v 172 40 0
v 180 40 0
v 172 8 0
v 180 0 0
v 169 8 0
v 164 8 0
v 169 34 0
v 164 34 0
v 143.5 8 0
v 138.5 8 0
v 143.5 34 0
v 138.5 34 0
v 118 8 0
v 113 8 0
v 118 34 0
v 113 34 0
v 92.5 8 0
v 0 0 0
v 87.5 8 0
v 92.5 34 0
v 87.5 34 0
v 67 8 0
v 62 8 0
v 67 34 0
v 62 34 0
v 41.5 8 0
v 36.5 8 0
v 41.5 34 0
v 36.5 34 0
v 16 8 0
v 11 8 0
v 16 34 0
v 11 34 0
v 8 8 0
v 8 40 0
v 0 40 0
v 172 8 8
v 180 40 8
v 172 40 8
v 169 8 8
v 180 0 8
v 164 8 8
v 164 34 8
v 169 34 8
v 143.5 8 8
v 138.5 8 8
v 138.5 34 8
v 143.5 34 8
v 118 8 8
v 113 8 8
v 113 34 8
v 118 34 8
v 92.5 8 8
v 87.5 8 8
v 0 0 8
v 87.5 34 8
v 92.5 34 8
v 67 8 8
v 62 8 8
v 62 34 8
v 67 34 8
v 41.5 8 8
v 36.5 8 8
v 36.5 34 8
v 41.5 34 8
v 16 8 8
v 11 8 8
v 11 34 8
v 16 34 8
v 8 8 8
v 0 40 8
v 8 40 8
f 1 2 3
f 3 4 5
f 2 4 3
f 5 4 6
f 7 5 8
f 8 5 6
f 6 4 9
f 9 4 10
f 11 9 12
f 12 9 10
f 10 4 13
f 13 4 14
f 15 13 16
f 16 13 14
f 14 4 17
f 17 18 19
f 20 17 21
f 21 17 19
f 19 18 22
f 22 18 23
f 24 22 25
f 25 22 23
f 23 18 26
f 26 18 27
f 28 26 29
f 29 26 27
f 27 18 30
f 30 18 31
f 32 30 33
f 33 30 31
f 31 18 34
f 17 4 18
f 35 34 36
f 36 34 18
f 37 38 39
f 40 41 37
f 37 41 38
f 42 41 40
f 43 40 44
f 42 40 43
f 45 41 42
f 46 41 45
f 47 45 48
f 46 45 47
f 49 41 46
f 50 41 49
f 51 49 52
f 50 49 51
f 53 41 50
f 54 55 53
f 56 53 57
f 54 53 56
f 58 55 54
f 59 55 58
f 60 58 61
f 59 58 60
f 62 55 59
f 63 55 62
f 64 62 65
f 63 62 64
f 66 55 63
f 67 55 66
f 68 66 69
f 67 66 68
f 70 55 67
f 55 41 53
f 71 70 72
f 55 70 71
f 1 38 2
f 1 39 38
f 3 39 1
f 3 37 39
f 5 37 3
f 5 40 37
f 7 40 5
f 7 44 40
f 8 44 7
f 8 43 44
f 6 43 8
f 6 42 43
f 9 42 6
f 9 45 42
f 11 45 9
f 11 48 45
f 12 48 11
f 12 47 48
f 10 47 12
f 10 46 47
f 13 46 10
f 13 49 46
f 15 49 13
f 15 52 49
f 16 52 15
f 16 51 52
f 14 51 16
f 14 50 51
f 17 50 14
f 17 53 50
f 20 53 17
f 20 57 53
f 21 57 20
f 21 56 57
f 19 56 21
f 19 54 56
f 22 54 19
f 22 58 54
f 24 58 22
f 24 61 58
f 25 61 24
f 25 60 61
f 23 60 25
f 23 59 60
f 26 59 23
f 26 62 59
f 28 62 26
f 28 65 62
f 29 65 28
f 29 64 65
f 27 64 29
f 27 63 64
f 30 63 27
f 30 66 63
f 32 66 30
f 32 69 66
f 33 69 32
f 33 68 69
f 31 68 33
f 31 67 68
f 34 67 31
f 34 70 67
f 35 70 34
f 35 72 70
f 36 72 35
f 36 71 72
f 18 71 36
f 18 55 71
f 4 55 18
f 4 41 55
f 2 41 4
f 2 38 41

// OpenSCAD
$fn = 32;

// ----------------------------------------------------------------------
// Guard grille: 7 slats over a 180 x 40 mm plate
// ----------------------------------------------------------------------

// --- parameters (mm) ---
profile_height = 8;       // extrusion height
profile_points = 36;      // points of the closed outline

profile = [[0, 0], [180, 0], [180, 40], [172, 40], [172, 8], [169, 8], [169, 34], [164, 34], [164, 8], [143.5, 8], [143.5, 34], [138.5, 34], [138.5, 8], [118, 8], [118, 34], [113, 34], [113, 8], [92.5, 8], [92.5, 34], [87.5, 34], [87.5, 8], [67, 8], [67, 34], [62, 34], [62, 8], [41.5, 8], [41.5, 34], [36.5, 34], [36.5, 8], [16, 8], [16, 34], [11, 34], [11, 8], [8, 8], [8, 40], [0, 40]];  // single closed polygon, 36 points, counter clockwise

// --- the one profile operation ---
linear_extrude(height = profile_height) polygon(points = profile);
